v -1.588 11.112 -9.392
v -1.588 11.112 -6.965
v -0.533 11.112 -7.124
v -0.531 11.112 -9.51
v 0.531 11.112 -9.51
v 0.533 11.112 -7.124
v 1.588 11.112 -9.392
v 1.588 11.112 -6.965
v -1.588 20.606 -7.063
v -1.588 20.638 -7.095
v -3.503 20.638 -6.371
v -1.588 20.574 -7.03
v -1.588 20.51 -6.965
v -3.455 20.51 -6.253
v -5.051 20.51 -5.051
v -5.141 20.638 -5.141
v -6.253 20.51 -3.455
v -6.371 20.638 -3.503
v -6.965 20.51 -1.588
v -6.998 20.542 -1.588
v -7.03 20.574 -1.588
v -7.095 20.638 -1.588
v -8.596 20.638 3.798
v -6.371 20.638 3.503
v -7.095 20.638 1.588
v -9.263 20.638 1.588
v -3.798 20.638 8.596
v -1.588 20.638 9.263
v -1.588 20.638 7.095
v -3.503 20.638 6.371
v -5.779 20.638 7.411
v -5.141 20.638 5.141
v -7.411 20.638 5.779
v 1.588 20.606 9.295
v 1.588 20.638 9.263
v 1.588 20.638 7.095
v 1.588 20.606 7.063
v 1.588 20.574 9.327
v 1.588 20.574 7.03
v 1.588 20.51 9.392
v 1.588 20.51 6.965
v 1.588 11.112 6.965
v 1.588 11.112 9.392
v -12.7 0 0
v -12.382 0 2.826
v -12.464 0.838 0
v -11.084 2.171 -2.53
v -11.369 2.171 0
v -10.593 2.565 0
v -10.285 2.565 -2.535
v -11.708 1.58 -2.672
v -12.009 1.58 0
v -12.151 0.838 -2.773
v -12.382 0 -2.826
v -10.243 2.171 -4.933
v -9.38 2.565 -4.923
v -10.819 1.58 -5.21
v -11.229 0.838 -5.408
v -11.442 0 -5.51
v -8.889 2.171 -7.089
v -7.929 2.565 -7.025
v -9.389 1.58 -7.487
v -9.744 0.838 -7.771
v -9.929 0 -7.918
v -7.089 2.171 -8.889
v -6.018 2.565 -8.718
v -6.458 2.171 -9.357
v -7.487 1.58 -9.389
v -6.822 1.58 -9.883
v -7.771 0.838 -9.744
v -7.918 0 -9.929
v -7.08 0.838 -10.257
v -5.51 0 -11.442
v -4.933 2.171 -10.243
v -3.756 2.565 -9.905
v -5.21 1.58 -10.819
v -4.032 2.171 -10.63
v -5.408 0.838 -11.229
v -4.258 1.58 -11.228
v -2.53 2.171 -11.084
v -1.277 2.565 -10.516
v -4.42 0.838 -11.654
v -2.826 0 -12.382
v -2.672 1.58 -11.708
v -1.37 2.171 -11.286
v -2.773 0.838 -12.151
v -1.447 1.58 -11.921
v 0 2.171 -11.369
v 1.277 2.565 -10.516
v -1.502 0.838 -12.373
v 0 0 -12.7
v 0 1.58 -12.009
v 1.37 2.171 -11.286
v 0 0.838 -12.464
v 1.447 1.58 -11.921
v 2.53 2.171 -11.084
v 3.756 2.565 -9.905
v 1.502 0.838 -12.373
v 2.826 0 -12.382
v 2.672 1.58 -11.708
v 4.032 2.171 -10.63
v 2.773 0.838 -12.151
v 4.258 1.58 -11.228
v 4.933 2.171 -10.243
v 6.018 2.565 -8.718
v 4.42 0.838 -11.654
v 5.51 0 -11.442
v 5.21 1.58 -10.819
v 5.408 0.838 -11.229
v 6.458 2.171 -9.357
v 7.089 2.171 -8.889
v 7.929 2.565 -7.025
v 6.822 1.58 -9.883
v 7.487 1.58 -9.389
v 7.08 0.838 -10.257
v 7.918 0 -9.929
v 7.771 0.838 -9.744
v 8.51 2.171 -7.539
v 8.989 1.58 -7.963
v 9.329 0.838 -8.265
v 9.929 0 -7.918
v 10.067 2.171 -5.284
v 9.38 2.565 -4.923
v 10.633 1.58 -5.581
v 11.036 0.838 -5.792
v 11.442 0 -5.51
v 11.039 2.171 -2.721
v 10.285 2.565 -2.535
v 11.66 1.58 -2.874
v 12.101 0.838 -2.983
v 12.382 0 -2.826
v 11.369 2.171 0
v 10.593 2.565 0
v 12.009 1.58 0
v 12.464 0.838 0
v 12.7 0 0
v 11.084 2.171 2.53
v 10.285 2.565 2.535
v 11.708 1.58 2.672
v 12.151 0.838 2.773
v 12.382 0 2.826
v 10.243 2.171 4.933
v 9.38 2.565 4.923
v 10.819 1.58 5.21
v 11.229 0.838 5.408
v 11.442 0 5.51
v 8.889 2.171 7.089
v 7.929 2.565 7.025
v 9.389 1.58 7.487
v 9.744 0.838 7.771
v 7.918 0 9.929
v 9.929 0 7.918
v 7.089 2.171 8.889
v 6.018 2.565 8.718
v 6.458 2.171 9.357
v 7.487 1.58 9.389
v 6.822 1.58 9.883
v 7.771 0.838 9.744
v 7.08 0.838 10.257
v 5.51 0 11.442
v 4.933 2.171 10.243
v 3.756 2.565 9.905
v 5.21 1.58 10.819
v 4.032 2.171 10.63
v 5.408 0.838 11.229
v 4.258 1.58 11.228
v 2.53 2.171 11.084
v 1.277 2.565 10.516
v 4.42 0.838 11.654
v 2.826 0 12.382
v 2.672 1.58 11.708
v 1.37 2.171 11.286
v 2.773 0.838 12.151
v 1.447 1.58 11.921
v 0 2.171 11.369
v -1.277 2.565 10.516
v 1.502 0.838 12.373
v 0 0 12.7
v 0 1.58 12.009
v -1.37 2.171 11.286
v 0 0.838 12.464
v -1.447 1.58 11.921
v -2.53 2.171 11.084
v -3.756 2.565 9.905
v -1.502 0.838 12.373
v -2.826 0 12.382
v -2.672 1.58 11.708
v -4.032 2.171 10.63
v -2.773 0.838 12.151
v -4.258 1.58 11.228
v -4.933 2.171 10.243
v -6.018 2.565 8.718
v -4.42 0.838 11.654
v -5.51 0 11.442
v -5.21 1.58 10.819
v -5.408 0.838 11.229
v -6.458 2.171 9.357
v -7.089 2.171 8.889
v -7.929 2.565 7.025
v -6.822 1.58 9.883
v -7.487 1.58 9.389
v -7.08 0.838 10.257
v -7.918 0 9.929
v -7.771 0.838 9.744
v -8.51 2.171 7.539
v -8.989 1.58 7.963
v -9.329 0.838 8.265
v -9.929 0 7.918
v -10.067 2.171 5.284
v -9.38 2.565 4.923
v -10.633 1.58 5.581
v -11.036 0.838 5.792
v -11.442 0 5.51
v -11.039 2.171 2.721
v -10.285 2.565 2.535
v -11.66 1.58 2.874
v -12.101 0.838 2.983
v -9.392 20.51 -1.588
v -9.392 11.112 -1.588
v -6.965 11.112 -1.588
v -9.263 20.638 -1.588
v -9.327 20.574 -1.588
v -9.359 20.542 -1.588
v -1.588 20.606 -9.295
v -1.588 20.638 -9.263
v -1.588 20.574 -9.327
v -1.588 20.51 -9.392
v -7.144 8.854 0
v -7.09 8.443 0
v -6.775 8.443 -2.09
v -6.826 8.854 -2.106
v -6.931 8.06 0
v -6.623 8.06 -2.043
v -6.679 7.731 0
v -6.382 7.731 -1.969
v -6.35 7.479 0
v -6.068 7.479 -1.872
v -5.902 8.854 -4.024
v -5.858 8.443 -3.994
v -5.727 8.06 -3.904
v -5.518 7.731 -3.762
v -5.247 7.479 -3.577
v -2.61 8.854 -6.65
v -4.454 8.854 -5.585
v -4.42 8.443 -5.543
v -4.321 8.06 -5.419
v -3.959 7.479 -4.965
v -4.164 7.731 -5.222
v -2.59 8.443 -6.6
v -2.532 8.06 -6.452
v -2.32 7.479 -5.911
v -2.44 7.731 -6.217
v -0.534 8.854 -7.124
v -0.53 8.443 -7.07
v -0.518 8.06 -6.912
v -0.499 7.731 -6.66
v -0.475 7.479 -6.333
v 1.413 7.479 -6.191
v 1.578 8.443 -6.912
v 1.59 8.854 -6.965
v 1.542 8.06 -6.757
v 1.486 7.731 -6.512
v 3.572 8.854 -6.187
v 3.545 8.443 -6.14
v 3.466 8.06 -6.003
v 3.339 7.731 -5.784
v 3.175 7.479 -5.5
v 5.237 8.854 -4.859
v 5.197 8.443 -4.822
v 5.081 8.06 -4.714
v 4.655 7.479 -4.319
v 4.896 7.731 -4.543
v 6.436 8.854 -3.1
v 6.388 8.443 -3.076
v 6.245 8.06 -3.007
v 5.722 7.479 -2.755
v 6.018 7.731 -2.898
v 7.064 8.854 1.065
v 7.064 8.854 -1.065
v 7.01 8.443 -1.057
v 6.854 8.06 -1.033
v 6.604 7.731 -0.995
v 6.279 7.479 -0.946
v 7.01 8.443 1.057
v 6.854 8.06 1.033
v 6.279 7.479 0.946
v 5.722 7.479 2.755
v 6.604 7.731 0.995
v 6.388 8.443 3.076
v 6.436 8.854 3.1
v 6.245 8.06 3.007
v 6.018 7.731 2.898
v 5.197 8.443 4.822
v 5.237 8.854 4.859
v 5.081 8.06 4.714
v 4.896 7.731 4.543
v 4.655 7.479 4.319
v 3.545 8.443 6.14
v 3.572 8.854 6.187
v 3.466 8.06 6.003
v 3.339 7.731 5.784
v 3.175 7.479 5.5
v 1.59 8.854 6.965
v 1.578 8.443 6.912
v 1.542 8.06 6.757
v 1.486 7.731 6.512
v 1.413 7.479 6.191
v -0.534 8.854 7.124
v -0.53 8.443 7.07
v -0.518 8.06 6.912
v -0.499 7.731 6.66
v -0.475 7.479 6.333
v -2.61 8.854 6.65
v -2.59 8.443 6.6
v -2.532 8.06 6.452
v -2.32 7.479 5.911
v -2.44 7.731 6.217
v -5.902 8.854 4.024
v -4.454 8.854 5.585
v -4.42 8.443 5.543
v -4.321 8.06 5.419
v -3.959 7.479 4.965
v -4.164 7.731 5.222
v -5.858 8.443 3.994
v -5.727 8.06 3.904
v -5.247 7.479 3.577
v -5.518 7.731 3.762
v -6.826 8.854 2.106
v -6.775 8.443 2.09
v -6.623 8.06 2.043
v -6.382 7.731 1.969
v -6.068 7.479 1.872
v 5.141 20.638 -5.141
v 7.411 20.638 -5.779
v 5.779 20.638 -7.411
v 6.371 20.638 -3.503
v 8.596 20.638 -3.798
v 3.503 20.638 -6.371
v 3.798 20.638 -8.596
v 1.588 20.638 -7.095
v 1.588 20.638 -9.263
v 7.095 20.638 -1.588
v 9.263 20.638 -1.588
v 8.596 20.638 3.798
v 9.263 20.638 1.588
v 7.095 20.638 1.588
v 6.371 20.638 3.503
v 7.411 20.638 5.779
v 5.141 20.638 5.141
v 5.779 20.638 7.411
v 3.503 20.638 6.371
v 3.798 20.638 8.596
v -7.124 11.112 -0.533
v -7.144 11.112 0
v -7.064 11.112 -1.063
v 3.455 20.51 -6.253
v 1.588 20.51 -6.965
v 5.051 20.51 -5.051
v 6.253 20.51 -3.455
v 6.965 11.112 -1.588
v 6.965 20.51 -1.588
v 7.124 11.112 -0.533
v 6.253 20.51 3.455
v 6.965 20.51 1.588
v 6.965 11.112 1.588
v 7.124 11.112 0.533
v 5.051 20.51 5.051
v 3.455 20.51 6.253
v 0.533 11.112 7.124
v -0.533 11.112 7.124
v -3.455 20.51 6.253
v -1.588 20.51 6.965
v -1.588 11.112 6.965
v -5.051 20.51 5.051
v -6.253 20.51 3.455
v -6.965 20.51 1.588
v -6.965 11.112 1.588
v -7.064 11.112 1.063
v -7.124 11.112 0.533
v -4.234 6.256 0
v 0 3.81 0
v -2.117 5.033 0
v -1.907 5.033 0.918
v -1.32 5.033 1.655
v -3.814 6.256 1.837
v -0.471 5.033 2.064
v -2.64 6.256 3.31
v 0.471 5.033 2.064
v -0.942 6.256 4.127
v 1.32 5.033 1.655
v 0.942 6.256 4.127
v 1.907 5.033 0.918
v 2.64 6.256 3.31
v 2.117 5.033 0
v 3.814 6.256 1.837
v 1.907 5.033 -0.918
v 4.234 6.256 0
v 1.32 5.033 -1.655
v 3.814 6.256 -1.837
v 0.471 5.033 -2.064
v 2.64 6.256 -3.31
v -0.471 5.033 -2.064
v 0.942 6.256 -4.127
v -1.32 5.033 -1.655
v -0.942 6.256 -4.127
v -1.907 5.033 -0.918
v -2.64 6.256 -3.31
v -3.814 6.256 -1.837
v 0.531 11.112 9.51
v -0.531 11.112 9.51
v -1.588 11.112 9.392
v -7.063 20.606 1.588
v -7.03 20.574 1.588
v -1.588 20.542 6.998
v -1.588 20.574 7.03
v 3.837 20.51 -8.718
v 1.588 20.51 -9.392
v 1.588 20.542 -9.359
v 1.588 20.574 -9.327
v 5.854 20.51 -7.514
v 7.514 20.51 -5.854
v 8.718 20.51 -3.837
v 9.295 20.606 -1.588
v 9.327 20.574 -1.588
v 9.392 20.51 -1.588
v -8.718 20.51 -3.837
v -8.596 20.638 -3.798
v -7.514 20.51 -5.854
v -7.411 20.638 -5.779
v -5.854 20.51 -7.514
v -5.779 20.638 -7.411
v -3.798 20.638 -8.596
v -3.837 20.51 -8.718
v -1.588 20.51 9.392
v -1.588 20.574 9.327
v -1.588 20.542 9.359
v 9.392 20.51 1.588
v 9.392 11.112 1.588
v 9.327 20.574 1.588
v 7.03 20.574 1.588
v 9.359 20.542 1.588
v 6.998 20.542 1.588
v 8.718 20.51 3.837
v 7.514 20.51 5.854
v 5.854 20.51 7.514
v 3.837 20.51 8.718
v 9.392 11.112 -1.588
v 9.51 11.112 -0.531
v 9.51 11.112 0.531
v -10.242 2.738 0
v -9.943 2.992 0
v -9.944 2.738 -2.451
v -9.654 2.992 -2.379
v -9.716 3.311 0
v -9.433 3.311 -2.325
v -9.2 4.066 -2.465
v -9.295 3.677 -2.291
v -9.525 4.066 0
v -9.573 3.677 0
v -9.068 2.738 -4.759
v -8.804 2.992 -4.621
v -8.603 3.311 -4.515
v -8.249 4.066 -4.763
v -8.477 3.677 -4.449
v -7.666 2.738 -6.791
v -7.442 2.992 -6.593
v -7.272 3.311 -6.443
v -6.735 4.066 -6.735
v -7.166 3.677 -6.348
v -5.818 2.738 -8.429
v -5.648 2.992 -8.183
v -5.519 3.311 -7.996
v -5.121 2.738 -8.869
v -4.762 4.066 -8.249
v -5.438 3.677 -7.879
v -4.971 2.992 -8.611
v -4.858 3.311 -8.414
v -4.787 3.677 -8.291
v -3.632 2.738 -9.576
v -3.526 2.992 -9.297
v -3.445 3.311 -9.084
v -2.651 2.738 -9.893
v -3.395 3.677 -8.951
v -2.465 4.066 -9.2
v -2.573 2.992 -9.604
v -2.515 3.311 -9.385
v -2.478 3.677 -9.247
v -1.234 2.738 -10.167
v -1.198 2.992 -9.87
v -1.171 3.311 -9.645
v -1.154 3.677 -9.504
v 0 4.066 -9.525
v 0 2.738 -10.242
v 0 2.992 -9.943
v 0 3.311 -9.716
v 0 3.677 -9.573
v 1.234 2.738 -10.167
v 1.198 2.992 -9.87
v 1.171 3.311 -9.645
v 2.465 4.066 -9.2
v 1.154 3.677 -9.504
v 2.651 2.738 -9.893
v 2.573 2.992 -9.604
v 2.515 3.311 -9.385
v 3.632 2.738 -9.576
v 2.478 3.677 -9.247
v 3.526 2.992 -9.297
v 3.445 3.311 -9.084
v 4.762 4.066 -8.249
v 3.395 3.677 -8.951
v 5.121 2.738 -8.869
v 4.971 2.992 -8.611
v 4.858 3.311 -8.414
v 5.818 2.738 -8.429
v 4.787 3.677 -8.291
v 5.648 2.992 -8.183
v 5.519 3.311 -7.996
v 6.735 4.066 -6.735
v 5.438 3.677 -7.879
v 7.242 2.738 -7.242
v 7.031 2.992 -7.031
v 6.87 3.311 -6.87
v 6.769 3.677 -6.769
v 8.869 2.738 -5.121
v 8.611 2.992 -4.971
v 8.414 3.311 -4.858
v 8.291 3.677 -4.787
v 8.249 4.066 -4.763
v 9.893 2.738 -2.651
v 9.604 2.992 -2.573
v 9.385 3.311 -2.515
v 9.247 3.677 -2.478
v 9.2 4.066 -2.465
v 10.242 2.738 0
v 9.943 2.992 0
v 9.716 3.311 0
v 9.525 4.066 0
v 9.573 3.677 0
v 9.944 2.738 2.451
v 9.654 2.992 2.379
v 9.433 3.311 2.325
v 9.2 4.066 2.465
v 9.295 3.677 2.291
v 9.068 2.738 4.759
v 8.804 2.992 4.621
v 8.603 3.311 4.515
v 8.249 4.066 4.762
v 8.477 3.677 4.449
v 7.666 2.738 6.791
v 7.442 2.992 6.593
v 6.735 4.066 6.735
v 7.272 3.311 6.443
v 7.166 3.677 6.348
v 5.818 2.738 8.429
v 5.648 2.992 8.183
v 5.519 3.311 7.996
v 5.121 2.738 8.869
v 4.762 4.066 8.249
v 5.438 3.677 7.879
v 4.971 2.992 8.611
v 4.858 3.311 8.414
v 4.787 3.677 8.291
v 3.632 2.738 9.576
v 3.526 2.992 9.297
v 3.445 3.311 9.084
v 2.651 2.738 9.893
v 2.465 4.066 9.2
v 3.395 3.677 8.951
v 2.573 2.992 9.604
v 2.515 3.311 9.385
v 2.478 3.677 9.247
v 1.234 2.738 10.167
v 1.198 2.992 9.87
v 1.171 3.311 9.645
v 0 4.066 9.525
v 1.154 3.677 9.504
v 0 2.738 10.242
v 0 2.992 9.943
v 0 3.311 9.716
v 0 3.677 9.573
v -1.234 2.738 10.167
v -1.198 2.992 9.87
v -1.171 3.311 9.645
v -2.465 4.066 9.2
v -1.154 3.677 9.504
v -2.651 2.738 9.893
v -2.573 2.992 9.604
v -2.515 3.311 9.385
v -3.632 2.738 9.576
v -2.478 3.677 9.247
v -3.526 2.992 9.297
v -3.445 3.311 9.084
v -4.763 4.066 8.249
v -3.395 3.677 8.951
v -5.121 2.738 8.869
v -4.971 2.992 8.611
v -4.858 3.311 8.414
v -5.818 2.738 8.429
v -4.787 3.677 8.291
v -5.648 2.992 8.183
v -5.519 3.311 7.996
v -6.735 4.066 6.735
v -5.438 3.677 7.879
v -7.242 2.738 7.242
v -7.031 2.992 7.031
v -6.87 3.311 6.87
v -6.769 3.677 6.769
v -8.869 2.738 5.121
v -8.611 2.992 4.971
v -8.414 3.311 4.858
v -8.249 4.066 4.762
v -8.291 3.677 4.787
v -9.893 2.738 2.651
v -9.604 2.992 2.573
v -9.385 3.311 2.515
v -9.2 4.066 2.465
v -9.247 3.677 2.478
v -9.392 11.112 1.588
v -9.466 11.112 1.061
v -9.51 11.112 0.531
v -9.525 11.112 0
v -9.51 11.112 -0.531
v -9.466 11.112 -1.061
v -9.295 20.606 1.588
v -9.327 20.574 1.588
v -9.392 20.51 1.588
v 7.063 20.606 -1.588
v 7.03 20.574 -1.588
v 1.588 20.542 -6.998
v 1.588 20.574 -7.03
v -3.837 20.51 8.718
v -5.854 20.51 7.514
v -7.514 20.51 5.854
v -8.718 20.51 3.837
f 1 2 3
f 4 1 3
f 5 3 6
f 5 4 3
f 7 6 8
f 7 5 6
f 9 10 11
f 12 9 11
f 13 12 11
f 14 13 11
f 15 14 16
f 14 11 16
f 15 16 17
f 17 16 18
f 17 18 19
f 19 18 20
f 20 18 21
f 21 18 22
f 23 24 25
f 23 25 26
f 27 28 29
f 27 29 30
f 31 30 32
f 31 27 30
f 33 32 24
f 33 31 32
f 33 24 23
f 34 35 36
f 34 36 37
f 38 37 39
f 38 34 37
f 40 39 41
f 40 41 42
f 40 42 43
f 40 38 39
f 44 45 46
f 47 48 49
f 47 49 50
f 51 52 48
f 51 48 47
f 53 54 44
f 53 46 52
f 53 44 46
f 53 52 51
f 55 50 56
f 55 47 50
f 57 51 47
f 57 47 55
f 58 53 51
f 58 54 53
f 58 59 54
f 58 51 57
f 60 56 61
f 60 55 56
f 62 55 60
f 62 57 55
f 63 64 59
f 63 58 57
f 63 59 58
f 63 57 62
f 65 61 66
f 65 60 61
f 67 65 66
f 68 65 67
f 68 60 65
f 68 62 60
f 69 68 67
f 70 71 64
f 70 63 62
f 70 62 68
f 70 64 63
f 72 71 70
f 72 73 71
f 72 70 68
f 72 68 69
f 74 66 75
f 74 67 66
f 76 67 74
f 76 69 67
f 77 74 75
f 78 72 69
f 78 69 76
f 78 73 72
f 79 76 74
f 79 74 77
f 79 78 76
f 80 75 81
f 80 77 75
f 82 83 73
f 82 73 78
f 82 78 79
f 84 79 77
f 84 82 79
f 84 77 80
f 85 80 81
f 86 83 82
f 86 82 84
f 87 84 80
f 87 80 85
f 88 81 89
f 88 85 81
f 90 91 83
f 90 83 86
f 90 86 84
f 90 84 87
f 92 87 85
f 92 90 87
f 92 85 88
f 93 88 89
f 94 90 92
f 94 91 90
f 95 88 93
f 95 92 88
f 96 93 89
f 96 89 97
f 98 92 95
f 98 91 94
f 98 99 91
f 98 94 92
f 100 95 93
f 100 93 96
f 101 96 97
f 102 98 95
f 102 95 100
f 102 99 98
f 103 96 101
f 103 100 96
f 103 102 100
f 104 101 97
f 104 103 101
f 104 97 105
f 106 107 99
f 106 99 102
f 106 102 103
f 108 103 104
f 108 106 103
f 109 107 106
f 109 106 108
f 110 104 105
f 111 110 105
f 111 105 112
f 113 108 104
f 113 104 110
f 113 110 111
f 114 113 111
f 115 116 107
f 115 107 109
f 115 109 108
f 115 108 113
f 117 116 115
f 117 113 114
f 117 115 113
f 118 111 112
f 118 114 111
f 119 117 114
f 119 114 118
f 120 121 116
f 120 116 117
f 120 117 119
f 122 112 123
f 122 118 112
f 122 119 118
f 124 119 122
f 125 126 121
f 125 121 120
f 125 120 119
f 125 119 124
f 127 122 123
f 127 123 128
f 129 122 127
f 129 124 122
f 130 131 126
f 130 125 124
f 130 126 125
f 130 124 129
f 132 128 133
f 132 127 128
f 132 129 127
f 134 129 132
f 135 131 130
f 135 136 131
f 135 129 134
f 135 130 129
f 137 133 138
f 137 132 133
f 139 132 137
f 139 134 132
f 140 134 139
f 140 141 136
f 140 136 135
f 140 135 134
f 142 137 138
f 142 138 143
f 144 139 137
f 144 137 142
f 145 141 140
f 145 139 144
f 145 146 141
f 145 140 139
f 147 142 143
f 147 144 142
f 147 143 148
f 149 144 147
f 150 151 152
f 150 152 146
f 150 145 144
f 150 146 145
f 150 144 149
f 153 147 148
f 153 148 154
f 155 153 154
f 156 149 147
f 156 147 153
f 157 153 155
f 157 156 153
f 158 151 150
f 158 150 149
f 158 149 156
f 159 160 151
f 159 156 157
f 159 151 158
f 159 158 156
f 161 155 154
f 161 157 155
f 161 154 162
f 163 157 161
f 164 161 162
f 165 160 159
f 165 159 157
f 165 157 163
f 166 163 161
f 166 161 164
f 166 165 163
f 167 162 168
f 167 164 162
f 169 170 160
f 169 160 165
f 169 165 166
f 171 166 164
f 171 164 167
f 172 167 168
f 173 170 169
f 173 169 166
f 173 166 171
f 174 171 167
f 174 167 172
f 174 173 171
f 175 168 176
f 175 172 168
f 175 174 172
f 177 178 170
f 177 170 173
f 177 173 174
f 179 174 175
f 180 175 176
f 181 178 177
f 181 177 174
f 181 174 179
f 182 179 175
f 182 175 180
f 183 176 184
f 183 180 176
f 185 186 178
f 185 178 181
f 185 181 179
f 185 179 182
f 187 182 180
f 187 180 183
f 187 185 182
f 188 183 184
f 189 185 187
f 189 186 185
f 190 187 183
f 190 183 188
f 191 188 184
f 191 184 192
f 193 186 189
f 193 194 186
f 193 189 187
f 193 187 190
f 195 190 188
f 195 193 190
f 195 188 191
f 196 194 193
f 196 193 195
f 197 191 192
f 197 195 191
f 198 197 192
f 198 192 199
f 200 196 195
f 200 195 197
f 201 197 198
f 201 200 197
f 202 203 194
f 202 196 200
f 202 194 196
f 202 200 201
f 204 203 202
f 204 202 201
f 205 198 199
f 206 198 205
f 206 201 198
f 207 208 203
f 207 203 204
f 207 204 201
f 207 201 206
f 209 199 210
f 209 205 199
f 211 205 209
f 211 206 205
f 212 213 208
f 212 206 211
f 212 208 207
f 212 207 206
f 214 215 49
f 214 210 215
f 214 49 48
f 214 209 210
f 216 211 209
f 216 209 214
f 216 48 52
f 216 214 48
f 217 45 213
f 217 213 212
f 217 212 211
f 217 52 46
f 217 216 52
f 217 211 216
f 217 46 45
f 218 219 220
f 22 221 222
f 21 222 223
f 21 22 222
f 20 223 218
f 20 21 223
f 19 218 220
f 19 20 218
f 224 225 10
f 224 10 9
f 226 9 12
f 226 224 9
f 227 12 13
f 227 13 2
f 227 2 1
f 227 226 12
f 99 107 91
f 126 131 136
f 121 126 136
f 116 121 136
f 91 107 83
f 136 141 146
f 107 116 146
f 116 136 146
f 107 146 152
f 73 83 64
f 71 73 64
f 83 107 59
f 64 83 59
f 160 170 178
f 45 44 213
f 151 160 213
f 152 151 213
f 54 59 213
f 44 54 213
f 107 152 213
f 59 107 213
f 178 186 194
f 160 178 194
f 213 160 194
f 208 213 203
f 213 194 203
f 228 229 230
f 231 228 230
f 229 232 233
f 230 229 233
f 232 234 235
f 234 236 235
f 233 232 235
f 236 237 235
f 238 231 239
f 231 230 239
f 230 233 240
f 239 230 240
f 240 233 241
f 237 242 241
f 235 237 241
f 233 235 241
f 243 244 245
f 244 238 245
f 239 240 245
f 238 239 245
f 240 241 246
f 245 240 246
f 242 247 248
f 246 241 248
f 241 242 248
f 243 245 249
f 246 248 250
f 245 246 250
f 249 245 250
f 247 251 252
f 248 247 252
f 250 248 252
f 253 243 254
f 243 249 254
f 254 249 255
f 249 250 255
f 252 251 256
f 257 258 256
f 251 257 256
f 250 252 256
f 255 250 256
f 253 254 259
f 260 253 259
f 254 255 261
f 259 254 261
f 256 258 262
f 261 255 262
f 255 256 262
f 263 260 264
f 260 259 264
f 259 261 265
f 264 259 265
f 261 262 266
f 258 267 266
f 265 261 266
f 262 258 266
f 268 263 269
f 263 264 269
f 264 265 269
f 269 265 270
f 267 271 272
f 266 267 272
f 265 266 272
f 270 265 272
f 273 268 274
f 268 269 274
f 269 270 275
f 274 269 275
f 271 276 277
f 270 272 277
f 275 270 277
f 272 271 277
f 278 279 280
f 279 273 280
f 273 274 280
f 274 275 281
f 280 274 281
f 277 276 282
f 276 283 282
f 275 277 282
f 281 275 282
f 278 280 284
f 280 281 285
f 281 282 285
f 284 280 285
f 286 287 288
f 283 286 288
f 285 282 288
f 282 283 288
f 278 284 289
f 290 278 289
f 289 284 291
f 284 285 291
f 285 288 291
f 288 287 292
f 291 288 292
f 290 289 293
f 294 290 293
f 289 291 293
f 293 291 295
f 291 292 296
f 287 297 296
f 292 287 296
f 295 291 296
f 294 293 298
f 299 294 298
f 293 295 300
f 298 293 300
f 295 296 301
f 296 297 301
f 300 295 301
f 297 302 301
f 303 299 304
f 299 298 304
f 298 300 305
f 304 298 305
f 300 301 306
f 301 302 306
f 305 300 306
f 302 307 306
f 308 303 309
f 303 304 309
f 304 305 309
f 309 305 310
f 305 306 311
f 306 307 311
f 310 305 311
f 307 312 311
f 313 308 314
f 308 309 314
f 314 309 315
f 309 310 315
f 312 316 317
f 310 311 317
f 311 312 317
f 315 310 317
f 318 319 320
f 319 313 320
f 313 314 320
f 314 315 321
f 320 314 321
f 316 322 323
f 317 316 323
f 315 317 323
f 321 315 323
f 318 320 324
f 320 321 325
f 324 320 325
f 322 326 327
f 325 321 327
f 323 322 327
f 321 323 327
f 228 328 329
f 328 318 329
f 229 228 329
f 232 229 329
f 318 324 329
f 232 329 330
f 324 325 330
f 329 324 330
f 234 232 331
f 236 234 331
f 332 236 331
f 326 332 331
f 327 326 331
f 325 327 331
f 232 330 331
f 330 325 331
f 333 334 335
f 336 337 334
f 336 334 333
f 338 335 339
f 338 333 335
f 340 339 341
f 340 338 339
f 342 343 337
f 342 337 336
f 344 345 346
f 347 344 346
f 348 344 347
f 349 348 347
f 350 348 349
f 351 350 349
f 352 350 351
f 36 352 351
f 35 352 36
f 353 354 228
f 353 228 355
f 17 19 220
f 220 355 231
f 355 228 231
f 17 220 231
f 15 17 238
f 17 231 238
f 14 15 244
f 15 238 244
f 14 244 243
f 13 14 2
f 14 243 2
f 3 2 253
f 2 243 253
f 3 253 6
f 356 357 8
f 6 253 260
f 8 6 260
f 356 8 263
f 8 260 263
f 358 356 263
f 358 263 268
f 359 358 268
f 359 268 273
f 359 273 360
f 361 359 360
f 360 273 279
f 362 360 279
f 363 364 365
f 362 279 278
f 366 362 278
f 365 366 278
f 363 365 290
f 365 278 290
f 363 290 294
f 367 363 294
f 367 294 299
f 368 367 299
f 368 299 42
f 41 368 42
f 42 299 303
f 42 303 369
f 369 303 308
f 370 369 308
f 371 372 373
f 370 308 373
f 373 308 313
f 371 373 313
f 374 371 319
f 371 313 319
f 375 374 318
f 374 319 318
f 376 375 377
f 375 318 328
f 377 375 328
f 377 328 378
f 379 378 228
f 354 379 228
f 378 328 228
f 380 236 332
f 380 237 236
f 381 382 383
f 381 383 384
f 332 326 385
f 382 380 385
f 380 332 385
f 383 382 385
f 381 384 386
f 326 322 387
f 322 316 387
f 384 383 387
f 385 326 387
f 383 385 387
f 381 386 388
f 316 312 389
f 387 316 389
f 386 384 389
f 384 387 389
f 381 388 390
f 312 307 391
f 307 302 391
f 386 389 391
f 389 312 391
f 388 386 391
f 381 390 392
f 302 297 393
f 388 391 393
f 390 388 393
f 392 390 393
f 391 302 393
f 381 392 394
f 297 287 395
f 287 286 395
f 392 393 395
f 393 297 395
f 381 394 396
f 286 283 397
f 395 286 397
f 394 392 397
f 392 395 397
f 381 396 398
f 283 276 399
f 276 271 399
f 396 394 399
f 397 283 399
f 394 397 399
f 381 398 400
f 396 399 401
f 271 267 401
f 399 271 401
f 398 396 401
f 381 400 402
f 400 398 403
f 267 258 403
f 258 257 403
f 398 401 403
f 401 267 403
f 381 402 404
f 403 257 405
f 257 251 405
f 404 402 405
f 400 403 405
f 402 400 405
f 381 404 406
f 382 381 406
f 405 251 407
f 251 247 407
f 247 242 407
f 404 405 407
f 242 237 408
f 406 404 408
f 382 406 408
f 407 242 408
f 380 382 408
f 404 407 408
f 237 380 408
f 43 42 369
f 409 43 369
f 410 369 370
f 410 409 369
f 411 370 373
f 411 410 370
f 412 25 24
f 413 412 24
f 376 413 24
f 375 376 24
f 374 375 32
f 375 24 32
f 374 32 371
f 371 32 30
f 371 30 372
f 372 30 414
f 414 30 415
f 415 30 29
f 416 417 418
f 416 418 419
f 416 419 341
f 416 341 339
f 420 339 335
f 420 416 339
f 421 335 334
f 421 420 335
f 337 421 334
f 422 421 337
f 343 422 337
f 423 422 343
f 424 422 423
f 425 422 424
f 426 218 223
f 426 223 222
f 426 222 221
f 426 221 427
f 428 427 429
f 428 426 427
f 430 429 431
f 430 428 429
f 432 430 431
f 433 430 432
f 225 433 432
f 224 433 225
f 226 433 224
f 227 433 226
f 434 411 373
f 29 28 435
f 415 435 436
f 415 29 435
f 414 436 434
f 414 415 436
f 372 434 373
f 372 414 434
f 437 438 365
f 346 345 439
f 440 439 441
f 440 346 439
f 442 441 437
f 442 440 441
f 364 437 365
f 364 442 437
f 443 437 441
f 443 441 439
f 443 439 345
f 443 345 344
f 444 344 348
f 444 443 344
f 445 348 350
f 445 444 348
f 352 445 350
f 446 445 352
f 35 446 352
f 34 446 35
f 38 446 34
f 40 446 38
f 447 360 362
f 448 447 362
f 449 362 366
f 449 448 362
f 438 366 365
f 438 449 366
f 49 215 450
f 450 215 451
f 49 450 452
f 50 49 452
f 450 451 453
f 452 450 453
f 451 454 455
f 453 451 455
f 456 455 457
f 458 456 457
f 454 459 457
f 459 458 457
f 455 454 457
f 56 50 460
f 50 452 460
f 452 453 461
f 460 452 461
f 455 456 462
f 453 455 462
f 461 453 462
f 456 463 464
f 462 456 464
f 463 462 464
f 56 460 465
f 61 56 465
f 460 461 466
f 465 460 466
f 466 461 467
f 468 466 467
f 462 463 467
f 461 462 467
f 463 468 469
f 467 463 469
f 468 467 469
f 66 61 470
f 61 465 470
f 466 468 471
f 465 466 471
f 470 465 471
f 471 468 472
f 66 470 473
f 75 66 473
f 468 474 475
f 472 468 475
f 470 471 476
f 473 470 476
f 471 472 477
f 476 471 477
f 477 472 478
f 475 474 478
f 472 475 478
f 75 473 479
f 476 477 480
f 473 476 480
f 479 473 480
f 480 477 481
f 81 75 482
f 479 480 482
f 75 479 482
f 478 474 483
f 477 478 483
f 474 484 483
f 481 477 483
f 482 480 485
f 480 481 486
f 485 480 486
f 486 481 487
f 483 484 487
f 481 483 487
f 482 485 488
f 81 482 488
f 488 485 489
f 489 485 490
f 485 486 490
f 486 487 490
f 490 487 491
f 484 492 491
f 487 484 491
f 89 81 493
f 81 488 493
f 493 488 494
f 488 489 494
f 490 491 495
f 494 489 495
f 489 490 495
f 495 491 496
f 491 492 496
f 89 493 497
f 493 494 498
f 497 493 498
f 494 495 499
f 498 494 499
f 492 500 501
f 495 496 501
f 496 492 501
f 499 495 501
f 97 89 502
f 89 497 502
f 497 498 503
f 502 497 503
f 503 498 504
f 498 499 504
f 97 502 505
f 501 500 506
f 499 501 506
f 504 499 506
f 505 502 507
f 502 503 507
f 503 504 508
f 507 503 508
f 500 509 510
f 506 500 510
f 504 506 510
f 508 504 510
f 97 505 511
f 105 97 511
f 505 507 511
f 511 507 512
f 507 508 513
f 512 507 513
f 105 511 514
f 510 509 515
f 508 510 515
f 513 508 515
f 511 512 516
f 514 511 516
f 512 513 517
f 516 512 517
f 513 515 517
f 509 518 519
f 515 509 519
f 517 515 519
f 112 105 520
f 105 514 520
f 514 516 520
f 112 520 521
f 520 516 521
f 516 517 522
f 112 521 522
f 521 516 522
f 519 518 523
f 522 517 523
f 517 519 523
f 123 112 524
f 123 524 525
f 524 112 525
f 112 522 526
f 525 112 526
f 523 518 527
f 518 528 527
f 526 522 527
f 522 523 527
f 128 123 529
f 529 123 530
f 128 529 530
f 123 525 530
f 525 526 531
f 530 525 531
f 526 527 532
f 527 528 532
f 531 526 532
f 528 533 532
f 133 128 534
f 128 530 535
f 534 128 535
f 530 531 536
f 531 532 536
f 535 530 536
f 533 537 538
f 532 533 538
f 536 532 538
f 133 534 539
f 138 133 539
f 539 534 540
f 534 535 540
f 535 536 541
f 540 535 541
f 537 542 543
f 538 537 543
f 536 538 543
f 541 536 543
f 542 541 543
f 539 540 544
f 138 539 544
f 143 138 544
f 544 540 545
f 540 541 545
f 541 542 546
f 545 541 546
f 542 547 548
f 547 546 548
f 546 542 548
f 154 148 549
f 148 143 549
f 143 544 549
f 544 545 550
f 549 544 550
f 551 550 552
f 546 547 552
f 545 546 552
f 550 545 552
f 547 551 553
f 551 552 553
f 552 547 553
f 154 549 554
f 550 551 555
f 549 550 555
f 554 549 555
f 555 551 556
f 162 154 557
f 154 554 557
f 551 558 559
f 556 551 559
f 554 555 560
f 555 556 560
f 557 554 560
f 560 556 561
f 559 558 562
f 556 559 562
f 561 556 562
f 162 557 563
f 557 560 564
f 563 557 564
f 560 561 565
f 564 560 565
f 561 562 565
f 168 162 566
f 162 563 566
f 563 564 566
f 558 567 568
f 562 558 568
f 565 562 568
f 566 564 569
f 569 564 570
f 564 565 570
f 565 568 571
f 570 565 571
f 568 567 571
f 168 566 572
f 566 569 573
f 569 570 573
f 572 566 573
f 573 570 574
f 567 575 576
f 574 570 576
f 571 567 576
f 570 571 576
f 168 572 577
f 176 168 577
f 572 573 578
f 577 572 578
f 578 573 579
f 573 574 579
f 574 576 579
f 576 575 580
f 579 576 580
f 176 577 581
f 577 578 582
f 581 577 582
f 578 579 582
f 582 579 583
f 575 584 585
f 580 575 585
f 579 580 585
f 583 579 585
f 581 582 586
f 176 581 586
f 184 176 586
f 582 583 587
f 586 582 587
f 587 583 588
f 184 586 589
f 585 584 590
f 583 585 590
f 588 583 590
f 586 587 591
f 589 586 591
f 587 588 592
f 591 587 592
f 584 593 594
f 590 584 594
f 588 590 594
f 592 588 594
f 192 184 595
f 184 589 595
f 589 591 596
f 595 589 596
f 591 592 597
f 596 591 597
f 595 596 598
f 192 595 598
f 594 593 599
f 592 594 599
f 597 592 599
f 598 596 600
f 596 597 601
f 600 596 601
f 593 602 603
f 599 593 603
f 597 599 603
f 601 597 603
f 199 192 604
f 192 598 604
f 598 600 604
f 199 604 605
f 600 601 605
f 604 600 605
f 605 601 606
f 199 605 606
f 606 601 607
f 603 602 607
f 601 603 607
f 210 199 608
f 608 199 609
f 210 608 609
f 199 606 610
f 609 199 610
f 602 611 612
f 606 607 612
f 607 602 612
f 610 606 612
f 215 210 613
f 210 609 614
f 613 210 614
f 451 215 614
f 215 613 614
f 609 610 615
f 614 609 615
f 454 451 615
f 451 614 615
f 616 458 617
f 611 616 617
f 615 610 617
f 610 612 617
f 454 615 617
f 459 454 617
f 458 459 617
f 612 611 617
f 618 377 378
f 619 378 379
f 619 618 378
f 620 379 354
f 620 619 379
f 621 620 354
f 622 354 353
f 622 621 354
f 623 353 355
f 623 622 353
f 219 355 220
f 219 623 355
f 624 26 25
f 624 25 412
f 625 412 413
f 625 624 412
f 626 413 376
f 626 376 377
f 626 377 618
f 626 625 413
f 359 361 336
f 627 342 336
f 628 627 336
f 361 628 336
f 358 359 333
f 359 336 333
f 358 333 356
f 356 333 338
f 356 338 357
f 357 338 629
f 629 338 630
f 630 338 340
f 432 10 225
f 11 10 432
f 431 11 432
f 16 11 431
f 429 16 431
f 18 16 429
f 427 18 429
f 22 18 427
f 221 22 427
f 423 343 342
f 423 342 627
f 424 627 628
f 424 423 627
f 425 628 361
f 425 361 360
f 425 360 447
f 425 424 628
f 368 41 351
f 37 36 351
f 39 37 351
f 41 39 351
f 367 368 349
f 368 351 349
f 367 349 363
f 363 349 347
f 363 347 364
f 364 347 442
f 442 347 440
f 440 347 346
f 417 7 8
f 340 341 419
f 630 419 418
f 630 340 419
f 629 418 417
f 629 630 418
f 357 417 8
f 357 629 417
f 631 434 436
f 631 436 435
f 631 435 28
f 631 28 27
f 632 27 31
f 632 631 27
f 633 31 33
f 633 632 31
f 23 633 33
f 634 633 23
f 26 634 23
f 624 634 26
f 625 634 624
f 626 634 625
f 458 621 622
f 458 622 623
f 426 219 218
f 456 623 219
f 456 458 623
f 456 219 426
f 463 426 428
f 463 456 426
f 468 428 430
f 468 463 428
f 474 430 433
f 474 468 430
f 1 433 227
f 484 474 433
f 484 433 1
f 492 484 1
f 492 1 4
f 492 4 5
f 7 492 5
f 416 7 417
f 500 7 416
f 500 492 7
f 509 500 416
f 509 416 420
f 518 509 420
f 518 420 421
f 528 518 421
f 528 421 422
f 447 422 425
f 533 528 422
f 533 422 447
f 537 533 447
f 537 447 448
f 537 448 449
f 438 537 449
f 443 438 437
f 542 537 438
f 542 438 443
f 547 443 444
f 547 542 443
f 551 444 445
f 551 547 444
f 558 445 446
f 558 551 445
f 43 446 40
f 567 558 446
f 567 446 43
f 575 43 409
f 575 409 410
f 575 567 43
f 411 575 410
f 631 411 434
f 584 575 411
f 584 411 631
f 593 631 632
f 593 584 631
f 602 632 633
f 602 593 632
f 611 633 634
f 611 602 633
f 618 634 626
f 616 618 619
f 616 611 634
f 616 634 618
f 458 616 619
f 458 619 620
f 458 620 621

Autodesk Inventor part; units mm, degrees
ref_plane "YZ Plane" through (0, 0, 0) normal (1, 0, 0) x (0, 1, 0)
ref_plane "XZ Plane" through (0, 0, 0) normal (0, 1, 0) x (-1, 0, 0)
ref_plane "XY Plane" through (0, 0, 0) normal (0, 0, 1) x (1, 0, 0)
sketch "Sketch1" plane through (0, 0, 0) normal (0, 0, 1) x (1, 0, 0)
  line L0 (-7.1438, 20.6375) -> (-9.525, 20.6375)
  line L1 (-9.525, 20.6375) -> (-9.525, 4.0656)
  line L2 (-12.7, 0) -> (0, 0)
  line L3 (0, -4.6495) -> (0, 24.852) projected
  line L4 (-7.1438, 20.6375) -> (-7.1437, 8.8537)
  line L5 (-6.3504, 7.4791) -> (0, 3.81)
  line L6 (0, 3.81) -> (0, 0)
  arc A0 (-10.5933, 2.5654) -> (-9.525, 4.0656) centre (-11.1125, 4.0656) ccw
  arc A1 (-10.5933, 2.5654) -> (-12.7, 0) centre (-9.5549, -0.435) ccw
  arc A2 (-7.1437, 8.8537) -> (-6.3504, 7.4791) centre (-5.5563, 8.8537) ccw
  point P0 (-9.525, 3.175)
  point P1 (-7.1437, 7.9375)
  dimension "d0" = 20.6375
  dimension "d1" = 19.05
  dimension "d2" = 14.2875
  dimension "d3" = 12.7
  dimension "d4" = 3.175
  dimension "d5" = 25.4
  dimension "d6" = 1.5875
  dimension "d7" = 3.175
  dimension "d8" = 3.81
  dimension "d10" = 1.5875
revolve "Revolution1" add sketch "Sketch1" angle 360 about axis through (0, -10, 0) along (0, 1, 0)
chamfer "Chamfer1" distance 0.127 angle 45 2 edges at (9.525, 20.6375, 0) (7.1438, 20.6375, 0)
sketch "Sketch2" plane through (0, 20.6375, 0) normal (0, 1, 0) x (1, 0, 0)
  line L0 (1.5875, 9.6188) -> (1.5875, 6.8545)
  line L1 (1.5875, 6.8545) -> (-1.5875, 6.8545) construction
  line L2 (-1.5875, 6.8545) -> (-1.5875, 9.6188)
  line L3 (0, 17.78) -> (0, -17.78) construction
  arc A0 (1.5875, 9.4869) -> (-1.5875, 9.4869) centre (0, 0) ccw
  arc A1 (1.5875, 6.9651) -> (-1.5875, 6.9651) centre (0, 0) ccw
  dimension "d14" = 3.175
  dimension "d15" = 1.5875
extrude "Extrusion1" cut sketch "Sketch2" against normal blind 9.525
pattern_circular "Circular Pattern1" count 4 over 360 about axis through (0, -10, 0) along (0, 1, 0) of "Extrusion1"
equation "\"d15\" = 0.5 * d14"
properties part number "Disco de Apriete" material "Aluminum 6061-AHC"
